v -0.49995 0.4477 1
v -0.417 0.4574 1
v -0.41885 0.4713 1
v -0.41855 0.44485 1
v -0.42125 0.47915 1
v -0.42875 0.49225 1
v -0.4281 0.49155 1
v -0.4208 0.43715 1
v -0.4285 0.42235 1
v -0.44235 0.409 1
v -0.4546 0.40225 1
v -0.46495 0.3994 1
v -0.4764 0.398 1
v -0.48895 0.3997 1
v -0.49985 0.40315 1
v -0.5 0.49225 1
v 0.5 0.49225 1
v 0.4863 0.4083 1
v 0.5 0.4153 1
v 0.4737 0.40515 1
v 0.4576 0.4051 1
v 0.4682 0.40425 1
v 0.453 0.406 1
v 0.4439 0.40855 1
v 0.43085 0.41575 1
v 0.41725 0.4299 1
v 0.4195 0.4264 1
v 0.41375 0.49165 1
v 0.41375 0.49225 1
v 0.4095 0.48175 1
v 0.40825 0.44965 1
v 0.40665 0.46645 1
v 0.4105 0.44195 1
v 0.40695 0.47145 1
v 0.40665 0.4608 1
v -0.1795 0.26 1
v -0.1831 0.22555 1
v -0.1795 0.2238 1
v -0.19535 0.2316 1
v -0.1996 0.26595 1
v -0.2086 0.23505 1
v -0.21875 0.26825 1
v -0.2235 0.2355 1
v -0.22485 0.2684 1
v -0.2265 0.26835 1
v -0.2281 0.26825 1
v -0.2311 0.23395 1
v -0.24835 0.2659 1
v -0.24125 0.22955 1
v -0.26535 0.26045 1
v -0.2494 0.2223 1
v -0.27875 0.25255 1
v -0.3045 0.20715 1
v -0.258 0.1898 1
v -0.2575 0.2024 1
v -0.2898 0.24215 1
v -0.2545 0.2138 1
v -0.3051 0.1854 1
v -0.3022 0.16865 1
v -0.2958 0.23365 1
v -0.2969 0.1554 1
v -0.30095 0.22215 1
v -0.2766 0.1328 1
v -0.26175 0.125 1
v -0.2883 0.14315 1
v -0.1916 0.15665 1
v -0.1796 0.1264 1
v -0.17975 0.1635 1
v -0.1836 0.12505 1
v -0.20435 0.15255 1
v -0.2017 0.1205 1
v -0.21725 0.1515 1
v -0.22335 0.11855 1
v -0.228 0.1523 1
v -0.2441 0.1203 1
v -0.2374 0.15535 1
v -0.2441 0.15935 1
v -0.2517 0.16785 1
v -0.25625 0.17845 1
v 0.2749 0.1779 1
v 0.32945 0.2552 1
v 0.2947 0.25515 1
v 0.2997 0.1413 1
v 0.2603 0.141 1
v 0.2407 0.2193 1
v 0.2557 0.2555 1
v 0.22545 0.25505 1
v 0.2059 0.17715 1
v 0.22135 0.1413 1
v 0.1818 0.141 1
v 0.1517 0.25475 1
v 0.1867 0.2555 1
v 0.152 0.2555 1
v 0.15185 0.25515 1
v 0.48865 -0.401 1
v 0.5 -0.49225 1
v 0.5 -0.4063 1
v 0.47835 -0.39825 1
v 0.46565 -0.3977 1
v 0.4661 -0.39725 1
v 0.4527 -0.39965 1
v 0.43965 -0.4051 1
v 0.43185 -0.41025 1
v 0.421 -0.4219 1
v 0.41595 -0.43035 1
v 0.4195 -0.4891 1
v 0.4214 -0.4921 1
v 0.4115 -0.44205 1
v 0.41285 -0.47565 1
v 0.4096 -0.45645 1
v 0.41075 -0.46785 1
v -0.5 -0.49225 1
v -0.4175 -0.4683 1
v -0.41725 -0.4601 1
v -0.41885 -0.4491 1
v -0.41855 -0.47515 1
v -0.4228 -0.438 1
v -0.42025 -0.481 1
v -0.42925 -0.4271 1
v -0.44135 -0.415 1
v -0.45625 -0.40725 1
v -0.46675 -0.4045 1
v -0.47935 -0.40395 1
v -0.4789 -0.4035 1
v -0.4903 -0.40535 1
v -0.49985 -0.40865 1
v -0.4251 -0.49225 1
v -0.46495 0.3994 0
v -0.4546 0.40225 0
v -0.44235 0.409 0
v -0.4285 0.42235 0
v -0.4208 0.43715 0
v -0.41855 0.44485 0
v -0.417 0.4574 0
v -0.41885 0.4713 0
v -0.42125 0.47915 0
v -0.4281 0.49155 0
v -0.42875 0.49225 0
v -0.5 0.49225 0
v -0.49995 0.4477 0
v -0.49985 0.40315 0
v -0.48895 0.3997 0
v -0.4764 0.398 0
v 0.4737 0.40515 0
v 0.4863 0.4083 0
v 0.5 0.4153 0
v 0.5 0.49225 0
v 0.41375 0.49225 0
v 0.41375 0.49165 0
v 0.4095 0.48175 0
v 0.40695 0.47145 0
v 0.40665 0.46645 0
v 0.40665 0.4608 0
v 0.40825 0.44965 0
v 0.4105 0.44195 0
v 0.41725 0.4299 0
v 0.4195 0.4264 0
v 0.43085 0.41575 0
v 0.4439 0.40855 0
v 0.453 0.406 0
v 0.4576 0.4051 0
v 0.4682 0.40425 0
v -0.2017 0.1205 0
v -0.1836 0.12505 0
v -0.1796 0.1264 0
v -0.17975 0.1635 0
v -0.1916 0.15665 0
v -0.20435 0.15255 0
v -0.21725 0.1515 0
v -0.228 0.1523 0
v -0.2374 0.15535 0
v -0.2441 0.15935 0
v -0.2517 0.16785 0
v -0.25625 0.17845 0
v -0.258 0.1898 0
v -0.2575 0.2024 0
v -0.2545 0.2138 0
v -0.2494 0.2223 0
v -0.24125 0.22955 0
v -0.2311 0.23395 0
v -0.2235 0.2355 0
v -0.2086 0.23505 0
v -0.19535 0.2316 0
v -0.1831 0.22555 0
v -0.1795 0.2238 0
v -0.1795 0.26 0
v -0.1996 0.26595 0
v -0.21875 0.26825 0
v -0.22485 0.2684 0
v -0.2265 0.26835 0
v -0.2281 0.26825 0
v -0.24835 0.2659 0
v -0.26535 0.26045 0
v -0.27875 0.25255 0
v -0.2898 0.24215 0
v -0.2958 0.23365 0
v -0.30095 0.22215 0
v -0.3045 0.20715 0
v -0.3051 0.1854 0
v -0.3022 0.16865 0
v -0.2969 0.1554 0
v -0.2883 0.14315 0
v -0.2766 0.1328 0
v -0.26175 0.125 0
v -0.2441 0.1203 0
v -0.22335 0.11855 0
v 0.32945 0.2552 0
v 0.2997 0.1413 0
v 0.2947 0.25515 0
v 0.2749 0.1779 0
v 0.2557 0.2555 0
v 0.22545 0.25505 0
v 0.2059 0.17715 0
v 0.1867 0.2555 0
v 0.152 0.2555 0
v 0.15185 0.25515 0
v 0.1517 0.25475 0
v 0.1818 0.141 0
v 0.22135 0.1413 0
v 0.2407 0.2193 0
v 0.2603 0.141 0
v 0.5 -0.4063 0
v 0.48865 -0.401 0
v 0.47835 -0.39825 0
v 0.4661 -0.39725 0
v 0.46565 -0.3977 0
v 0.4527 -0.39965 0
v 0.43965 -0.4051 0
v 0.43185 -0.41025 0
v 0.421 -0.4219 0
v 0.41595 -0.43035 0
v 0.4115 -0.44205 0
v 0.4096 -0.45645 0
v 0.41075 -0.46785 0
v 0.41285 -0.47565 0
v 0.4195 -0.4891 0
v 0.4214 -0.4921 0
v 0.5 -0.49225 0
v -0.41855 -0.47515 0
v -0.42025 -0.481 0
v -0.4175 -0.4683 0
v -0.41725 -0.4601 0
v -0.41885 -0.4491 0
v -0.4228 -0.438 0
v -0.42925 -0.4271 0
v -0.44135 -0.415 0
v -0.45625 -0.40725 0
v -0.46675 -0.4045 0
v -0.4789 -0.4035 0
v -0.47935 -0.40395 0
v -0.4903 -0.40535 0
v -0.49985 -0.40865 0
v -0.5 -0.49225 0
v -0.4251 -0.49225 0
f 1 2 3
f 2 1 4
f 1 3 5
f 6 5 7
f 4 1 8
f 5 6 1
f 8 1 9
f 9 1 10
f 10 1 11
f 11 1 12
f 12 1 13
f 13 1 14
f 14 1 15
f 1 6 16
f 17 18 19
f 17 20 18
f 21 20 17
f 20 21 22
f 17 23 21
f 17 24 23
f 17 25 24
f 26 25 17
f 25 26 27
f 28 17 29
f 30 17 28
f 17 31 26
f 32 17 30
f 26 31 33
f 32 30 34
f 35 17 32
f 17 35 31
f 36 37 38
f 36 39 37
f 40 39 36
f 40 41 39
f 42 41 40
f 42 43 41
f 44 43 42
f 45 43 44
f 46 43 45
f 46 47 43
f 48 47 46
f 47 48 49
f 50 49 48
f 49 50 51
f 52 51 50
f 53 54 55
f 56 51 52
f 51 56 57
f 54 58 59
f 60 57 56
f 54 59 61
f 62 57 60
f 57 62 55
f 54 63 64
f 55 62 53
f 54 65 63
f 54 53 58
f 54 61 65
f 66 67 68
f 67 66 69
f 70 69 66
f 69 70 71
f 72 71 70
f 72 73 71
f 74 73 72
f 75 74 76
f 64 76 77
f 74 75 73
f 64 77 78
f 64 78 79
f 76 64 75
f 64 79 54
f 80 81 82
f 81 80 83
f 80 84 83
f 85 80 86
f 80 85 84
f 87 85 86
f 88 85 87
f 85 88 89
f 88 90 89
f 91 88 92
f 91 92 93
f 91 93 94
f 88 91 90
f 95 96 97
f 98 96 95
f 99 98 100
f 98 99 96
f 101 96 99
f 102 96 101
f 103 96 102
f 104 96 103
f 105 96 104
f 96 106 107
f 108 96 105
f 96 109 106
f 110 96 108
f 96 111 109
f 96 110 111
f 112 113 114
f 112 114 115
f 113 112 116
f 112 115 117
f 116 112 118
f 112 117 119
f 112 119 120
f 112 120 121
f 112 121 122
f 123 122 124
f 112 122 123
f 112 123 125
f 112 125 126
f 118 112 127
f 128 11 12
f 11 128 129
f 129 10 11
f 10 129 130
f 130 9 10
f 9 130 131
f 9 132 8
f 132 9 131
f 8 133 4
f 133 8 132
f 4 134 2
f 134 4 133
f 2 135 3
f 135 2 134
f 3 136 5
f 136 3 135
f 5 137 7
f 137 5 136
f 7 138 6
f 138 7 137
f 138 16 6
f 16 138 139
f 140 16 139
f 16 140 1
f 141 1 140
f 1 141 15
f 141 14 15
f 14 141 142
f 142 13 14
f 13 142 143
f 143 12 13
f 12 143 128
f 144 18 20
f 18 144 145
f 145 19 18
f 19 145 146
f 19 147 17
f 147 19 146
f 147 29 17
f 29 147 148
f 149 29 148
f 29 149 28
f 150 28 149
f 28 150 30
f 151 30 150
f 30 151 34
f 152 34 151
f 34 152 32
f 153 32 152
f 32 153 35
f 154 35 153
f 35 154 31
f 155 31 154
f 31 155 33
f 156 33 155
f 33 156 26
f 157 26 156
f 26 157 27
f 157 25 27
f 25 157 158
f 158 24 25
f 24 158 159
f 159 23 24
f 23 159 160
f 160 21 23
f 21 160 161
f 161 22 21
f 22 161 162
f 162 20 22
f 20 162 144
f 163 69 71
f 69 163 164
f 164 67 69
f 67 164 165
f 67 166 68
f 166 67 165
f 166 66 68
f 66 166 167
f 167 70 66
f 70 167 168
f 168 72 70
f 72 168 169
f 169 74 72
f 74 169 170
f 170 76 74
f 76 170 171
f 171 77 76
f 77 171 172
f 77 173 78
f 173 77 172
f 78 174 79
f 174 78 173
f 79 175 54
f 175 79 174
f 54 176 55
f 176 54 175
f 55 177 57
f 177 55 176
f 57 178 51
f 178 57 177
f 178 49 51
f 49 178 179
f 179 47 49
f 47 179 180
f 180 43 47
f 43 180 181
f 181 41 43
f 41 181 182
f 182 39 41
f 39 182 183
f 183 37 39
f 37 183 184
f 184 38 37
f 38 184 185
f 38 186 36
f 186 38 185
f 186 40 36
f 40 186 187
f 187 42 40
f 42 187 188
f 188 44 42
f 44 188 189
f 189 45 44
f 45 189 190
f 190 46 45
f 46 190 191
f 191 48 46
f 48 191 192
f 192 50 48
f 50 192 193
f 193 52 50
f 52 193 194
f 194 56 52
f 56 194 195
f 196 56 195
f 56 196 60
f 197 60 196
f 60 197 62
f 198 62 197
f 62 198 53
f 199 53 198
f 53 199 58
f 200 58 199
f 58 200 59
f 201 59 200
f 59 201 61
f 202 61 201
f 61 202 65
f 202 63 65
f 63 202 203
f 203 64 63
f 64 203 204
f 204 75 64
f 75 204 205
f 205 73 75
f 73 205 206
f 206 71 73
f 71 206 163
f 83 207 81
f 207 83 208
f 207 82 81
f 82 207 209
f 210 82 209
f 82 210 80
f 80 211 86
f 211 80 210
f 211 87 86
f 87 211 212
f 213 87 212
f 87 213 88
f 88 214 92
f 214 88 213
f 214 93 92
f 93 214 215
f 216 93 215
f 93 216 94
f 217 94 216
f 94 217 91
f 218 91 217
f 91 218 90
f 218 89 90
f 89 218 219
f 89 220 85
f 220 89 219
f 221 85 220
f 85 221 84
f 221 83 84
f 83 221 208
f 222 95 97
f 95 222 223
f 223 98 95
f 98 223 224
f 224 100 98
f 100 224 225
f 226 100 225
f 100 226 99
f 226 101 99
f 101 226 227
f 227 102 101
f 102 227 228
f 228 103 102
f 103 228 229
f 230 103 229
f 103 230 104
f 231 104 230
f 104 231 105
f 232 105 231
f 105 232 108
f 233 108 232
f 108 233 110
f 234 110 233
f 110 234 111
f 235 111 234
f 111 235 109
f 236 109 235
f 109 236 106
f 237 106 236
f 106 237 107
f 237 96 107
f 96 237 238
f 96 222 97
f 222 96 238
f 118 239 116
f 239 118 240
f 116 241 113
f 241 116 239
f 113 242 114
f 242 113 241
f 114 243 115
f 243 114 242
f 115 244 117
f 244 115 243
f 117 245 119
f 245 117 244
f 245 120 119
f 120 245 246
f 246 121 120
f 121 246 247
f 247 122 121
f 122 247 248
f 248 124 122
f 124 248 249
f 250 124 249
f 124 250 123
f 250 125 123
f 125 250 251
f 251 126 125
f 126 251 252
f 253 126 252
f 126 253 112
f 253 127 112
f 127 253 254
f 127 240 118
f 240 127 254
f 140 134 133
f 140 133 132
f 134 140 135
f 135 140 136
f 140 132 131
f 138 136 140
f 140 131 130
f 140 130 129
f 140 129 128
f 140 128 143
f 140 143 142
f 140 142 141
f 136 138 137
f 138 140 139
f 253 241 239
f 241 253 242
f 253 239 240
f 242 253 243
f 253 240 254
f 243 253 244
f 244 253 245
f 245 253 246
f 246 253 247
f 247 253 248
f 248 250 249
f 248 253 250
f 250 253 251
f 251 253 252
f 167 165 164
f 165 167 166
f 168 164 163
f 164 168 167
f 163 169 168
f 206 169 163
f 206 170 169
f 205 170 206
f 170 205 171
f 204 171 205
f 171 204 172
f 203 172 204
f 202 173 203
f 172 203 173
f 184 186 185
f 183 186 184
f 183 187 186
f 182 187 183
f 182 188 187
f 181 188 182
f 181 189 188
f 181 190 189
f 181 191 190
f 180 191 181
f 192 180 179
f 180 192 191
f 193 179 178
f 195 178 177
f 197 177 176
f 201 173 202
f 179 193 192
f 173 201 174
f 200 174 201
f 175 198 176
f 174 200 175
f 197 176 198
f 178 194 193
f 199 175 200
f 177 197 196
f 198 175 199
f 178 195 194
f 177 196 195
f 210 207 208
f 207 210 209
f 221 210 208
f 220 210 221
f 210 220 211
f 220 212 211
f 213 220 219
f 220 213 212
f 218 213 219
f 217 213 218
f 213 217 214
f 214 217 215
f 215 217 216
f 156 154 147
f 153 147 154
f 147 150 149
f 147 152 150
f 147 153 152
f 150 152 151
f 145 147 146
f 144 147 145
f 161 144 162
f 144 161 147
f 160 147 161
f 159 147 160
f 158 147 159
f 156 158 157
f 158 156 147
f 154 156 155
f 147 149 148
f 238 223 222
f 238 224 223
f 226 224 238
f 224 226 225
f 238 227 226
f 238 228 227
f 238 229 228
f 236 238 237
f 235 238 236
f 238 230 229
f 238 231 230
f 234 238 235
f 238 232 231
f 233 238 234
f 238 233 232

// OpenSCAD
module C3text2_1()
{
 /* Generated by trace2scad version 20150415
    http://aggregate.org/MAKE/TRACE2SCAD/
    Optimized model has 130/1056 original points
 */
 color([0.5, 0.5, 0.5])
 assign(minx=0) /* polygon minx=0 */
 assign(miny=0) /* polygon miny=0 */
 assign(maxx=20000) /* polygon maxx=20000 */
 assign(maxy=19690) /* polygon maxy=19690 */
 assign(dx=maxx-minx)
 assign(dy=maxy-miny)
 assign(maxd=((dx>dy)?dx:dy))
 scale([1/maxd, 1/maxd, 1])
 translate([-minx-dx/2, -miny-dy/2, 0])
 linear_extrude(height=1, convexity=130)
 union() {
  union() {
   polygon([[1,18799],[3,17908],[221,17839],[472,17805],[701,17833],[908,17890],[1153,18025],[1430,18292],[1584,18588],[1629,18742],[1660,18993],[1623,19271],[1575,19428],[1438,19676],[1425,19690],[0,19690]], convexity=5);
   polygon([[18275,19684],[18275,19678],[18190,19480],[18139,19274],[18133,19174],[18133,19061],[18165,18838],[18210,18684],[18345,18443],[18390,18373],[18617,18160],[18878,18016],[19060,17965],[19152,17947],[19364,17930],[19474,17948],[19726,18011],[20000,18151],[20000,19690],[18275,19690]], convexity=7);
   polygon([[5470,15212],[5438,15210],[5033,15163],[4693,15054],[4425,14896],[4204,14688],[4084,14518],[3981,14288],[3910,13988],[3898,13553],[3956,13218],[4062,12953],[4234,12708],[4468,12501],[4765,12345],[5118,12251],[5533,12216],[5966,12255],[6328,12346],[6408,12373],[6405,13115],[6168,12978],[5913,12896],[5655,12875],[5440,12891],[5252,12952],[5118,13032],[4966,13202],[4875,13414],[4840,13641],[4850,13893],[4910,14121],[5012,14291],[5175,14436],[5378,14524],[5530,14555],[5828,14546],[6093,14477],[6338,14356],[6410,14321],[6410,15045],[6008,15164],[5625,15210],[5503,15213]], convexity=12);
   polygon([[13037,14948],[13034,14940],[13636,12665],[14427,12671],[14814,14231],[15206,12665],[15994,12671],[16589,14949],[15894,14948],[15498,13403],[15114,14955],[14509,14946],[14118,13388],[13734,14955],[13040,14955]], convexity=11);
   polygon([[19317,1895],[19313,1891],[19054,1852],[18793,1743],[18637,1640],[18420,1407],[18319,1238],[18230,1004],[18192,716],[18215,488],[18257,332],[18390,63],[18428,3],[20000,0],[20000,1719],[19773,1825],[19567,1880],[19322,1900]], convexity=6);
   polygon([[417,1770],[413,1766],[194,1738],[3,1672],[0,0],[1498,0],[1595,225],[1629,342],[1650,479],[1655,643],[1623,863],[1544,1085],[1415,1303],[1173,1545],[875,1700],[665,1755],[422,1775]], convexity=5);
  }
 }
}

module C3text2()
{
 /* all layers combined, scaled to within a 1mm cube */
 scale([1, 1, 1/1])
 difference() {
  union() {
   scale([1,1,2]) translate([0,0,-0.5]) C3text2_1();
  }
  translate([0,0,-2]) cube([2,2,4],center=true);
 }
}
C3text2();
